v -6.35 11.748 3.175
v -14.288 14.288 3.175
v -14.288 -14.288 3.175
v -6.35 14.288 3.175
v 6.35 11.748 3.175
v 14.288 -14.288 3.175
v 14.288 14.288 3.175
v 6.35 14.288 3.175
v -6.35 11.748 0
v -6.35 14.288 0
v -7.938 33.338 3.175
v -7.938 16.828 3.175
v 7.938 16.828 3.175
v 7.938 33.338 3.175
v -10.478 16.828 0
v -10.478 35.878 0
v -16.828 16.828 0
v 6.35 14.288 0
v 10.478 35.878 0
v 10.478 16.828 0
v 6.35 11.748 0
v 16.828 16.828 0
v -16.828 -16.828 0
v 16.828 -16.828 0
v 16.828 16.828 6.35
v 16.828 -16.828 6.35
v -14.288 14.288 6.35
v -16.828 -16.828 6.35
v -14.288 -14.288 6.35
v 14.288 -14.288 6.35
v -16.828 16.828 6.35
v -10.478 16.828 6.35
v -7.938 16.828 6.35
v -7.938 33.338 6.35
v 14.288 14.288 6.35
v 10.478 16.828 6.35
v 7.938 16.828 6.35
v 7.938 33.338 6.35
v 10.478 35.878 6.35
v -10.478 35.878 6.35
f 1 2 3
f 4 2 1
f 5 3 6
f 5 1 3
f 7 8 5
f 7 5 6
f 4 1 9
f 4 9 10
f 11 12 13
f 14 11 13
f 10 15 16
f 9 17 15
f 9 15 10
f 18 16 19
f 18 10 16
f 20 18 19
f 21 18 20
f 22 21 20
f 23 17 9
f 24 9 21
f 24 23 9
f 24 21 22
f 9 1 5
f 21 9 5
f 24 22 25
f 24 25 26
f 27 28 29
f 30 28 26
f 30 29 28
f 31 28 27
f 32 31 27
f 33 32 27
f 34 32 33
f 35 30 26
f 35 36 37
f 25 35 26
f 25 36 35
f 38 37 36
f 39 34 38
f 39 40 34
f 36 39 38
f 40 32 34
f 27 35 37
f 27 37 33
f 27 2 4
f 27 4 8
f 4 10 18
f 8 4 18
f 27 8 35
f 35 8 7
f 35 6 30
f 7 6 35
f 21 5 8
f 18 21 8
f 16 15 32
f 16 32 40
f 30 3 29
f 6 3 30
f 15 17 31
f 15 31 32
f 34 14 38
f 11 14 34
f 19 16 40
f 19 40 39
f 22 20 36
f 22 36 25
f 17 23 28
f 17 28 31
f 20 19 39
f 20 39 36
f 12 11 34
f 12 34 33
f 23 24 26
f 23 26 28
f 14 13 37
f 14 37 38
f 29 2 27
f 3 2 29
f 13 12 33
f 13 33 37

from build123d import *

# Parameters (mm, degrees)
F2_DEPTH = 3.175
F4_DEPTH = 6.35
F5_W     = 15.875
F5_H     = 2.54
F6_DEPTH = 3.175
F7_W     = 12.7
F7_H     = 2.54
F8_DEPTH = 25.4


with BuildPart() as f2:
    # F1 (on offset) → F2 (new body)
    with BuildSketch(Plane.XY):
        Polygon((-7.9375, 14.2875), (-14.2875, 14.2875), (-14.2875, -14.2875), (14.2875, -14.2875), (14.2875, 14.2875), (7.9375, 14.2875), (7.9375, 33.3375), (-7.9375, 33.3375), align=None)
    extrude(amount=F2_DEPTH)

    # F3 (on face) → F4 (join)
    with BuildSketch(Plane(origin=(0, 0, 0), x_dir=(1, 0, 0), z_dir=(0, 0, -1))):
        Polygon((16.8275, -16.8275), (16.8275, 16.8275), (-16.8275, 16.8275), (-16.8275, -16.8275), (-10.4775, -16.8275), (-10.4775, -35.8775), (10.4775, -35.8775), (10.4775, -16.8275), align=None)
        Polygon((-14.2875, 14.2875), (14.2875, 14.2875), (14.2875, -14.2875), (7.9375, -14.2875), (7.9375, -33.3375), (-7.9375, -33.3375), (-7.9375, -14.2875), (-14.2875, -14.2875), align=None, mode=Mode.SUBTRACT)
    extrude(amount=-F4_DEPTH)

    # F5 (on face) → F6 (join, through all)
    with BuildSketch(Plane.XY.offset(3.175)):
        with Locations((0, 15.5575)):
            Rectangle(F5_W, F5_H)
    extrude(amount=F6_DEPTH)

    # F7 (on face) → F8 (cut)
    with BuildSketch(Plane.XY.offset(3.175)):
        with Locations((0, 13.0175)):
            Rectangle(F7_W, F7_H)
    extrude(amount=-F8_DEPTH, mode=Mode.SUBTRACT)


solid = f2.part
